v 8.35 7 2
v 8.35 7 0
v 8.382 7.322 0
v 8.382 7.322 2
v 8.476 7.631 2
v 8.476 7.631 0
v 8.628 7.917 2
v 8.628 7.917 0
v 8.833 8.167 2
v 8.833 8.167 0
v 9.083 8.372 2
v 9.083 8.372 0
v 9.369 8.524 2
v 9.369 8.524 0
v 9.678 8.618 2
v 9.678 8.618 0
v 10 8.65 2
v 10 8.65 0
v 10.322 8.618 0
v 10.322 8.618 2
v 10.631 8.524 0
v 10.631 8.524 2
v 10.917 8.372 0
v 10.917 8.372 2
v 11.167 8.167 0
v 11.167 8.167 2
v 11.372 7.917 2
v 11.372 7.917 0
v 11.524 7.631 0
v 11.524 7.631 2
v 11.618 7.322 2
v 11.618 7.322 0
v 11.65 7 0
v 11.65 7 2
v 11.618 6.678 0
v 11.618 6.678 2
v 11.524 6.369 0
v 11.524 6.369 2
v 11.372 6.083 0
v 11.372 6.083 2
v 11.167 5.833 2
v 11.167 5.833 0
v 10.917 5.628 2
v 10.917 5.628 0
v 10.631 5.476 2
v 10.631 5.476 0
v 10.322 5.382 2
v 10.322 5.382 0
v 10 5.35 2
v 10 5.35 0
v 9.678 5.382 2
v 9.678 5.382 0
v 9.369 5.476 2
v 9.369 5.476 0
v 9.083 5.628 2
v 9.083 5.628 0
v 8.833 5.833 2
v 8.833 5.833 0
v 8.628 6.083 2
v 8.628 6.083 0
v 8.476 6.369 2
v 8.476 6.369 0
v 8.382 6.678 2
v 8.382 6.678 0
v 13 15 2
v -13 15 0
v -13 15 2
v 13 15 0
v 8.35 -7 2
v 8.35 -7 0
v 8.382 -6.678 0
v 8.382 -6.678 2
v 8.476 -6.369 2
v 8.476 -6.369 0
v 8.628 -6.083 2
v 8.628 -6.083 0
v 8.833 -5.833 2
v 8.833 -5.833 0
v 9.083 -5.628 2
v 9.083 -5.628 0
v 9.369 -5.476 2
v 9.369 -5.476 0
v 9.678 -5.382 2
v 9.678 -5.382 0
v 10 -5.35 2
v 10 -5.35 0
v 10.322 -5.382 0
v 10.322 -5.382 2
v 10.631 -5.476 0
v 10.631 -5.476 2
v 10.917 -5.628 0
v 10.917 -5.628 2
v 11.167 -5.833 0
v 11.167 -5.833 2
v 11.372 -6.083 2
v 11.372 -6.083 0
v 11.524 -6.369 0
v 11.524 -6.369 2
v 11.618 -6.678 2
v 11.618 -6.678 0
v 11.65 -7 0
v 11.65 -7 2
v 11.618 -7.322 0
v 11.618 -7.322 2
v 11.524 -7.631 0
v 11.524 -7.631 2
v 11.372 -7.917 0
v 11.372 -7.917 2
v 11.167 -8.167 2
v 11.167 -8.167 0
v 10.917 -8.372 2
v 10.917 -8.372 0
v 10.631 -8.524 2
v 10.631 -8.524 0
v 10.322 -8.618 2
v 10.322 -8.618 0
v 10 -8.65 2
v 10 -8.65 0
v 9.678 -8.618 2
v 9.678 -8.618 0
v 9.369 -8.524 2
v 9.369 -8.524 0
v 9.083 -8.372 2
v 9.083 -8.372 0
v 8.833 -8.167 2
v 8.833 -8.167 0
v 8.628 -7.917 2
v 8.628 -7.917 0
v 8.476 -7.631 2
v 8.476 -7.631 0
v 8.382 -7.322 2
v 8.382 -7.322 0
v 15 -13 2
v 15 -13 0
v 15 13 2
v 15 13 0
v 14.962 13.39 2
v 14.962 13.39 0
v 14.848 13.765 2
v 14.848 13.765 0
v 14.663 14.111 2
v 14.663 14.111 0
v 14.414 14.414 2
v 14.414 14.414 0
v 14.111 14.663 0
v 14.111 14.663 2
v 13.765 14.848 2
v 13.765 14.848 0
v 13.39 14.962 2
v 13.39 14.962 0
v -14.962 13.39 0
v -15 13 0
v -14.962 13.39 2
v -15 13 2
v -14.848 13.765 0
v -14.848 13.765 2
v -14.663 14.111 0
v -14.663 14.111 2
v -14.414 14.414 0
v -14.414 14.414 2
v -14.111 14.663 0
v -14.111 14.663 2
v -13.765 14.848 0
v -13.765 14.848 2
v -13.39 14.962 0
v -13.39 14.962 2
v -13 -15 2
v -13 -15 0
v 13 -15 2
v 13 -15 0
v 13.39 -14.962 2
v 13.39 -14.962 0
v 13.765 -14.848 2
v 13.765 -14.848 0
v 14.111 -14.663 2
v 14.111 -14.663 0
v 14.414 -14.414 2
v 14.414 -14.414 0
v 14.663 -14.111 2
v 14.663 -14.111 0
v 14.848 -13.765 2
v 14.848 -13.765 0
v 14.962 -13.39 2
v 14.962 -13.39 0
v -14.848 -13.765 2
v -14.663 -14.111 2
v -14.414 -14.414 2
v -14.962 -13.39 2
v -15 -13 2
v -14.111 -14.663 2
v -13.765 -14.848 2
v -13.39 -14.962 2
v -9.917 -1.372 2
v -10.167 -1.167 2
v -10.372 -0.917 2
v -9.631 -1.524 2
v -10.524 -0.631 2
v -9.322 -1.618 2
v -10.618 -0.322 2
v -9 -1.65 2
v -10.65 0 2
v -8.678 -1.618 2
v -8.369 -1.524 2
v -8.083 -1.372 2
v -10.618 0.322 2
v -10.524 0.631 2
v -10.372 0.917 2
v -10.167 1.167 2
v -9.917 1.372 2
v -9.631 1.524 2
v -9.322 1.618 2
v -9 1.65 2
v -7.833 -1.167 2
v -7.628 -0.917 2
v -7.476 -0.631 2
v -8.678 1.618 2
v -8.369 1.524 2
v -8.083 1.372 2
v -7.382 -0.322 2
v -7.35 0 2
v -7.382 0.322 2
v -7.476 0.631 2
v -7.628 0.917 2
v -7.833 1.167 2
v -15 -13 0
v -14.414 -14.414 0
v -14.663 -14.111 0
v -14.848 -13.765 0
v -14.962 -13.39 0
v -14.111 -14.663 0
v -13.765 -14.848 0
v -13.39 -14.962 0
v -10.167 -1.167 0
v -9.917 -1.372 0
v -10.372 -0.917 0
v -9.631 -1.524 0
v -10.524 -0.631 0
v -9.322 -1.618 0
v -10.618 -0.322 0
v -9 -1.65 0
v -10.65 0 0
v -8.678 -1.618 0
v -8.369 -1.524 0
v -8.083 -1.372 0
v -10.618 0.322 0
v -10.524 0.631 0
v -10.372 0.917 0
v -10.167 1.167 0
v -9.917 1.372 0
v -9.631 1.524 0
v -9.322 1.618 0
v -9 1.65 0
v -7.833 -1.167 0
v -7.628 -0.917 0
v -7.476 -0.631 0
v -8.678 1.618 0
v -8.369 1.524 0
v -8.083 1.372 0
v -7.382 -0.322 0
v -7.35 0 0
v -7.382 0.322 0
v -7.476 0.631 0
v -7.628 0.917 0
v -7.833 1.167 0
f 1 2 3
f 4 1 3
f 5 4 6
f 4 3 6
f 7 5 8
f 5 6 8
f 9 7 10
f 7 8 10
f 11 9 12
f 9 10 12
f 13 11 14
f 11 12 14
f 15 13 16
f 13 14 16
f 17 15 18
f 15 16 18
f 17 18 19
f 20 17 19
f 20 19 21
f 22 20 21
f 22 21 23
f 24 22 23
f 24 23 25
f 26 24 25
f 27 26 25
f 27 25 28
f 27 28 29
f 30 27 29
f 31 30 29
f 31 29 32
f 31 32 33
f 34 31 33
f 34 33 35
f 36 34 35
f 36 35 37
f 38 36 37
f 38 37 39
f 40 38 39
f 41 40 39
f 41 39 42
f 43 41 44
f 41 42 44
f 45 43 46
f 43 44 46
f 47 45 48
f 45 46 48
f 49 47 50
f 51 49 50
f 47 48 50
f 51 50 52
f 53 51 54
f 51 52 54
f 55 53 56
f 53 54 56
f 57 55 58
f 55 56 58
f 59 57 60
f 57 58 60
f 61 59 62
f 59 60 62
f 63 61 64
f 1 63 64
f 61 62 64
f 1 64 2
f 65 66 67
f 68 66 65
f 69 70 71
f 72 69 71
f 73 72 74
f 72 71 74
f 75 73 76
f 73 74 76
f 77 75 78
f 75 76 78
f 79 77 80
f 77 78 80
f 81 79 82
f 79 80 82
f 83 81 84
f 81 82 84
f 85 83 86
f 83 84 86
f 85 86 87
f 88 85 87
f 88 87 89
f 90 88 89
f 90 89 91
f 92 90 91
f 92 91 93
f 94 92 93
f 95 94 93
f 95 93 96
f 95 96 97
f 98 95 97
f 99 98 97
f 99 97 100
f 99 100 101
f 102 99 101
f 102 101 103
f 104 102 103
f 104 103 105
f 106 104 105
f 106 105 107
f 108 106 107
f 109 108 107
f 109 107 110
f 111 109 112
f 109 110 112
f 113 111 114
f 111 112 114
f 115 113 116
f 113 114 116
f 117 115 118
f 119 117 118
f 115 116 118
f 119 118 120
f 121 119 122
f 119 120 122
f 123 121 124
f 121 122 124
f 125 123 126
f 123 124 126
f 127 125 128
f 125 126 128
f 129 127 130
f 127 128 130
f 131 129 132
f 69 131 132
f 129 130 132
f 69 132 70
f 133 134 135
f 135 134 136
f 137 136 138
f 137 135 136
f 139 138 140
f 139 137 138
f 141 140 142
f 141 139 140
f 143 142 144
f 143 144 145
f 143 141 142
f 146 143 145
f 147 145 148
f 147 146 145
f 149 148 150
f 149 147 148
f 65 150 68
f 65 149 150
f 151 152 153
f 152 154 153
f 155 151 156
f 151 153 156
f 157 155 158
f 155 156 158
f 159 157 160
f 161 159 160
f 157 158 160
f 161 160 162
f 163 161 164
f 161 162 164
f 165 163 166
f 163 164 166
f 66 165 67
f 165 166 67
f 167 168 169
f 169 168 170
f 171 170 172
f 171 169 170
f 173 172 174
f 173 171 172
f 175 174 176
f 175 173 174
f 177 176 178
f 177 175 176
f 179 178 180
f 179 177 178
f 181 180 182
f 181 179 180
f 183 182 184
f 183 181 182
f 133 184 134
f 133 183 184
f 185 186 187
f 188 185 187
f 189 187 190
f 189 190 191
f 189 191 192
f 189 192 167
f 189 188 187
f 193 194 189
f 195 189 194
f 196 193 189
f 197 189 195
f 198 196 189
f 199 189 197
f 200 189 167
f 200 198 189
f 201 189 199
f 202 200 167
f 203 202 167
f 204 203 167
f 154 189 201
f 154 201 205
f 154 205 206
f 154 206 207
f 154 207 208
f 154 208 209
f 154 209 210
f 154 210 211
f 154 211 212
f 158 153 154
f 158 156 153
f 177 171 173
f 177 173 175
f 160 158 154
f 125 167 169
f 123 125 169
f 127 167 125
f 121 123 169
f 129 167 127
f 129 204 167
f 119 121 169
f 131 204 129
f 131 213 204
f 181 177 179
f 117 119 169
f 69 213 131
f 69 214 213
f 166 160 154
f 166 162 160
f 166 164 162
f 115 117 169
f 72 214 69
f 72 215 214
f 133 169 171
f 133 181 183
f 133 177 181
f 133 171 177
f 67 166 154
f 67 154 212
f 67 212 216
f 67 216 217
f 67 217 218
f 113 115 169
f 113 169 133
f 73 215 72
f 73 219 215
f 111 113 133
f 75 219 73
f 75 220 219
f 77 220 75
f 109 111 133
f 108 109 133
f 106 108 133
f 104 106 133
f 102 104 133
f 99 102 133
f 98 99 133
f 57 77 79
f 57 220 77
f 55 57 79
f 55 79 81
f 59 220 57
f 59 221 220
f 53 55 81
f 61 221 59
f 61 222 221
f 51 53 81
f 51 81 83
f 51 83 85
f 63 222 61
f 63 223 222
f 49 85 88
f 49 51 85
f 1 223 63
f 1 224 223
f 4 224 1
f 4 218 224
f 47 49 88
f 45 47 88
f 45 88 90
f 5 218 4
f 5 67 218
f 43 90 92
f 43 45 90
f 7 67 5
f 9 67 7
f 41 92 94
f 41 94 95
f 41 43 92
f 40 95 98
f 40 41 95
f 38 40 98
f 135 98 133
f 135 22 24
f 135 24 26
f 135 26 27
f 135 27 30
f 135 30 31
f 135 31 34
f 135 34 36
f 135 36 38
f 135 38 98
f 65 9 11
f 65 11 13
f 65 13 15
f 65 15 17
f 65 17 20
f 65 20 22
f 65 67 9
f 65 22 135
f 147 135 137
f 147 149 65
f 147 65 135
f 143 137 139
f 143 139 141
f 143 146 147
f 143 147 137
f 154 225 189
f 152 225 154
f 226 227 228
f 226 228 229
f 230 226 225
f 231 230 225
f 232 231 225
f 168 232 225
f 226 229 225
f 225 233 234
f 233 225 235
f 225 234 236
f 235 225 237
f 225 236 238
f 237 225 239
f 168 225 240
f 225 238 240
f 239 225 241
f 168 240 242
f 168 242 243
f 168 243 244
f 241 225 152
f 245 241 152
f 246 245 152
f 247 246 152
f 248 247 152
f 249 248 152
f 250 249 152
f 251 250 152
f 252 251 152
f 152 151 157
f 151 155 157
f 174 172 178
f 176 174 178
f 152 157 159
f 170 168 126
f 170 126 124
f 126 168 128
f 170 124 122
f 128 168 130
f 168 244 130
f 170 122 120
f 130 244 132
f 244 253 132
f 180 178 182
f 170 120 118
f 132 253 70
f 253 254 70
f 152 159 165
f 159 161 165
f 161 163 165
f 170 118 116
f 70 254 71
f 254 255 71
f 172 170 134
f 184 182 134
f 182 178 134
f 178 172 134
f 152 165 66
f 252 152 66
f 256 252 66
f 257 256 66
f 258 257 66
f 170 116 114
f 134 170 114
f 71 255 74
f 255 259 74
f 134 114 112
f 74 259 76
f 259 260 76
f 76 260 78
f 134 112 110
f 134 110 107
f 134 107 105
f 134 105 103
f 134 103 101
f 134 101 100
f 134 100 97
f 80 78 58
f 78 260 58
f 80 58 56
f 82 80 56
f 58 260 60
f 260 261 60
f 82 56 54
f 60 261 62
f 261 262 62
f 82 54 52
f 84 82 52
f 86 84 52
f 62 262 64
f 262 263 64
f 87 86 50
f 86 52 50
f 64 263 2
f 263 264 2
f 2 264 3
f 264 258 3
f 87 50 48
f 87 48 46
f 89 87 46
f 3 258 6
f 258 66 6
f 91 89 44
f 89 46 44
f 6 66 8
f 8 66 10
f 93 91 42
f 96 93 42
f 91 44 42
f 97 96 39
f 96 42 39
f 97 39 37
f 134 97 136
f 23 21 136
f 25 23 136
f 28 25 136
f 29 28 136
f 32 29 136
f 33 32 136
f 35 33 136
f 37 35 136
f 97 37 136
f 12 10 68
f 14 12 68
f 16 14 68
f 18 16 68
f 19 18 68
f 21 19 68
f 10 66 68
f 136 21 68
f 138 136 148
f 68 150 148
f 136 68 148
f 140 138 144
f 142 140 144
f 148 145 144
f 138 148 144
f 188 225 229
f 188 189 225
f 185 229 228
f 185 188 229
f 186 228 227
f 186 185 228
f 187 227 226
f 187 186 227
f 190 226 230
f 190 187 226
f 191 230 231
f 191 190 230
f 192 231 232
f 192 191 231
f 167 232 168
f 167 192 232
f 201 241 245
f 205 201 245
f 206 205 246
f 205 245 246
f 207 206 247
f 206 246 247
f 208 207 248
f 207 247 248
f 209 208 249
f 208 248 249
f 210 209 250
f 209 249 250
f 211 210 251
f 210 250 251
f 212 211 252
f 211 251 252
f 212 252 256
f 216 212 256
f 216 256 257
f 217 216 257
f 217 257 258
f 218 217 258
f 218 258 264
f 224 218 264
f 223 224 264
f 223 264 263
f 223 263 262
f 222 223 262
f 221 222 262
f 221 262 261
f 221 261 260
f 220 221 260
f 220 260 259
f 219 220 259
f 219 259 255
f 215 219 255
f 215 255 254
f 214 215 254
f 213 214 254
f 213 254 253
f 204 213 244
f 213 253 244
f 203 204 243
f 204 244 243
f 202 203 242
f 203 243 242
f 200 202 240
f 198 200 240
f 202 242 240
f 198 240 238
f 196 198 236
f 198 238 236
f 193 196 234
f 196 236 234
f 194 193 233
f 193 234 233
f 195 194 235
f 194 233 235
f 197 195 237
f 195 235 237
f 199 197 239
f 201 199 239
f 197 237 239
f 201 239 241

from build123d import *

# Parameters (mm, degrees)
SKETCH1_W             = 30
SKETCH1_H             = 30
BOSS_EXTRUDE1_DEPTH   = 2
FILLET1_R             = 2
F_3_0MM_DOWEL_HOLE1_D = 3.3


with BuildPart() as part:
    # Sketch1 → Boss-Extrude1 (new body)
    with BuildSketch(Plane.XY):
        Rectangle(SKETCH1_W, SKETCH1_H)
    extrude(amount=BOSS_EXTRUDE1_DEPTH)

    # Fillet1
    fillet1_edges = [part.edges().sort_by_distance(p)[0] for p in [
        (15, -15, 1),
        (-15, -15, 1),
        (-15, 15, 1),
        (15, 15, 1),
    ]]
    fillet(fillet1_edges, radius=FILLET1_R)

    # Ø3.0mm Dowel Hole1 (through all)
    with Locations(Plane(origin=(-9, 0, 2), x_dir=(1, 0, 0), z_dir=(0, 0, 1))):
        with Locations((0, 0), (19, 7), (19, -7)):
            Hole(F_3_0MM_DOWEL_HOLE1_D / 2)


solid = part.part
